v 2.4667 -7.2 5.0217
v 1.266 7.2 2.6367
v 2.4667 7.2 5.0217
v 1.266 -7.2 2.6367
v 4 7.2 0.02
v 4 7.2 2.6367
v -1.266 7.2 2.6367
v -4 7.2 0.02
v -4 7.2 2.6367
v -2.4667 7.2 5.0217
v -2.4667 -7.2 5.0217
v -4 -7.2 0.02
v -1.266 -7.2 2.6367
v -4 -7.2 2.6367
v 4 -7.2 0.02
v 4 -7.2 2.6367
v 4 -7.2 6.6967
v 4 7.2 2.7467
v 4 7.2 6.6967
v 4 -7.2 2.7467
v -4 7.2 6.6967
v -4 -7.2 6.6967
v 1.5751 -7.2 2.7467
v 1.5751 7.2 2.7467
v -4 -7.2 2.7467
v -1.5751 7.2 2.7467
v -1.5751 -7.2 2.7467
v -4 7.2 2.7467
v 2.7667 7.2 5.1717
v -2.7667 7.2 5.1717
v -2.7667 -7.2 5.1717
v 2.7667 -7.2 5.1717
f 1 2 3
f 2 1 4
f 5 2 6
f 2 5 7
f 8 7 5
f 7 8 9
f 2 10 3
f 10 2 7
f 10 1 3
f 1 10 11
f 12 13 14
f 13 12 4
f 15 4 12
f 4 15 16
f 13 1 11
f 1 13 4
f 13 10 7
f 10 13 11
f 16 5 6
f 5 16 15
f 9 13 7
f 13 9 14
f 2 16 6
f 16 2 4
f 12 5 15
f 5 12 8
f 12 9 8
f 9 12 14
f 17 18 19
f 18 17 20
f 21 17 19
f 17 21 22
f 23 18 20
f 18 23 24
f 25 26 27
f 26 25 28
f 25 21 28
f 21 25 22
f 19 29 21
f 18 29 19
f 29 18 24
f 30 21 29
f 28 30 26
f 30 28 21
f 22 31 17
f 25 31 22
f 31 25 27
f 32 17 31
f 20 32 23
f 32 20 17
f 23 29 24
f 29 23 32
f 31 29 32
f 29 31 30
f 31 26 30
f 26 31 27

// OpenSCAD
// Generated by SolidPython 1.1.1 on 2021-06-21 20:42:31


translate(v = [0, 0, 2.6716666667]) {
	union() {
		union() {
			translate(v = [0, 7.2000000000, 0]) {
				rotate(a = 90, v = [1, 0, 0]) {
					linear_extrude(height = 14.4000000000) {
						polygon(points = [[-2.4666666667, 2.3500000000], [2.4666666667, 2.3500000000], [1.2333333333, -0.1000000000], [-1.2333333333, -0.1000000000]]);
					}
				}
			}
			translate(v = [0, 0, -1.3433333333]) {
				cube(center = true, size = [8, 14.4000000000, 2.6166666667]);
			}
		}
		difference() {
			translate(v = [0, 0, 2.0500000000]) {
				cube(center = true, size = [8, 14.4000000000, 3.9500000000]);
			}
			translate(v = [0, 7.2500000000, 0]) {
				rotate(a = 90, v = [1, 0, 0]) {
					linear_extrude(height = 14.5000000000) {
						polygon(points = [[-2.7666666667, 2.5000000000], [2.7666666667, 2.5000000000], [1.5333333333, -0.0100000000], [-1.5333333333, -0.0100000000]]);
					}
				}
			}
		}
	}
}
/***********************************************
*********      SolidPython code:      **********
************************************************
 
from copy import deepcopy
import solid as sl
import numpy as np
from numpy import pi
import os.path as path
from shape import Shape, rad2deg
from joint import Joint


KEYSWITCH_WIDTH = 14.4


# TODO: thumb cluster, wall / supports, wrist rest

# TODO: function to allign cols to a chosen row and vert align_cols(row, vert)
# would stretch out some of the more compressed rows

# TODO: function to stagger a column, like raise the pinky column up
# would need to calculate the change in the original z vector, [0,0,1]
# due to rotations to the key so we are going up in relation to the
# direction of the keys. Try only considering Y roatations to start
# considering x rotations may compress the column which we do not want

class KeyCapShape(Shape):
    def __init__(self, dims):
        super().__init__()
        self.dims = dims

    def init_shape(self):
        return sl.cube(self.dims, center=True)

    def init_origin(self):
        return np.array([0, 0, 0])

    def init_vertices(self):
        w, l, h = self.dims
        half_width = w / 2
        half_len = l / 2
        half_height = h / 2
        adj = .5
        return np.array([
            [half_width - adj, half_len - adj, -half_height + adj],
            [half_width - adj, -half_len + adj, -half_height + adj],
            [-half_width + adj, half_len - adj, -half_height + adj],
            [-half_width + adj, -half_len + adj, -half_height + adj],
            [half_width - adj, half_len - adj, half_height - adj],
            [half_width - adj, -half_len + adj, half_height - adj],
            [-half_width + adj, half_len - adj, half_height - adj],
            [-half_width + adj, -half_len + adj, half_height - adj]
        ])

    def init_vertice_shape(self):
        return sl.cube([1, 1, 1], center=True)

    def vert_colors(self):
        return [[1, 0, 0], [0, 1, 0], [0, 0, 1], [1, 0, 1],
                [1, 0, 0], [0, 1, 0], [0, 0, 1], [1, 0, 1]]


class SocketSkirt(Shape):
    def __init__(self, dims, switch_width, axis, deg):
        super().__init__()
        self.dims = dims

        x_trans = switch_width / 2 + dims[0] / 2 - 1
        self.rotate_y(deg)
        self.translate([x_trans, 0, -1])
        rot_deg = 90 * axis
        self.rotate_z(rot_deg)

    def init_vertices(self):
        w, l, h = self.dims
        hw, hl, hh = w / 2, l / 2, h / 2
        adj = 1
        return [
            [hw - adj, hl - adj, -adj],
            [hw - adj, -hl, -adj],
            [-hw, -hl, -adj],
            [-hw, hl-adj, -adj]
        ]

    def init_vertice_shape(self):
        return sl.cube([1, 1, self.dims[2]])

    def vert_colors(self):
        return [[1, 0, 0], [0, 1, 0], [0, 0, 1], [1, 0, 1]]

    def init_origin(self):
        return [0, 0, 0]

    def init_shape(self):
        return sl.cube(self.dims, center=True)


def SocketJoint(joint, key, axis, flip=False, trans=[0,0,0], hull=None):
    rot_deg = 90*axis
    if flip:
        joint.rotate_z(90)
    x_trans = key.width / 2 + joint.dim[0] / 2 + key.thickness/4 + .5
    joint.translate(np.add([x_trans, 0, 0], trans))
    joint.rotate_z(rot_deg)
    joint.actions += key.actions
    if hull:
        sock_axis_verts = [(1,3), (0,1), (0,2), (0,2)]
        joint_axis_verts = [3,3,0,3]
        if hull == "top":
            jhull = joint.top()
        elif hull=="bottom":
            jhull = joint.bottom()
        else:
            return joint, None
        hull = sl.difference()(sl.hull()(
            jhull.vertice_shape(joint_axis_verts[axis]),
            key.vertice_shapes(idxs=sock_axis_verts[axis])), joint.shape())

    return joint, hull

class SocketArea(Shape):
    def __init__(self, dim):
        super().__init__()
        self.dim = dim

    def init_shape(self):
        return sl.color([0,0,1], alpha=0.4)(sl.cube(self.dim, center=True))


class SwitchSocket(Shape):
    def __init__(self, dim, hot_swap=None, skirt=(0, 0, 0, 0),
                 cylinder_segments=100, side="right"):
        super().__init__()
        self.width, self.height, self.thickness = dim
        self.skirts = skirt
        self.cylinder_segments = cylinder_segments
        self.side = side
        self.hotswap_socket = hot_swap

    def init_shape(self):
        top_wall = sl.cube([self.width + 3, 1.5, self.thickness],
                           center=True)
        top_wall = sl.translate(
            (0, (1.5 / 2) + (self.height / 2), self.thickness / 2)
        )(top_wall)

        left_wall = sl.cube([1.5, self.height + 3, self.thickness],
                            center=True)
        left_wall = sl.translate(
            ((1.5 / 2) + (self.width / 2), 0, self.thickness / 2)
        )(left_wall)

        side_nub = sl.cylinder(1, 2.75, segments=self.cylinder_segments,
                               center=True)
        side_nub = sl.rotate(rad2deg(pi / 2), [1, 0, 0])(side_nub)
        side_nub = sl.translate((self.width / 2, 0, 1))(side_nub)
        nub_cube = sl.cube([1.5, 2.75, self.thickness], center=True)
        nub_cube = sl.translate(
            ((1.5 / 2) + (self.width / 2), 0, self.thickness / 2)
        )(nub_cube)

        side_nub = sl.hull()(side_nub, nub_cube)

        plate_half1 = top_wall + left_wall + side_nub
        plate_half2 = plate_half1
        plate_half2 = sl.mirror([0, 1, 0])(plate_half2)
        plate_half2 = sl.mirror([1, 0, 0])(plate_half2)

        plate = plate_half1 + plate_half2

        if self.hotswap_socket is not None:
            self.hotswap_socket = sl.translate((0, 0, self.thickness))(
                self.hotswap_socket)
            plate = sl.union()(plate, self.hotswap_socket)

        if self.side == "left":
            plate = sl.mirror([-1, 0, 0])(plate)

        return plate

    def init_origin(self):
        return np.array([0, 0, 0])

    def init_vertices(self):
        hw = (self.width + self.thickness) / 2
        hh = (self.width + self.thickness) / 2
        th = self.thickness / 2
        adj = 1
        return np.array([
            [-hw + adj, hh - adj, th],
            [hw - adj, hh - adj, th],
            [-hw + adj, -hh + adj, th],
            [hw - adj, -hh + adj, th]
        ])

    def init_vertice_shape(self):
        return sl.cube([1, 1, self.thickness - 1], center=True)

    def vert_colors(self):
        return [[1, 0, 0], [0, 1, 0], [0, 0, 1], [1, 0, 1]]

    def area(self):
        w,l,h = self.width, self.height, self.thickness
        # this area is flush with the top of the socket
        # area = SocketArea([w, l, h*2])

        area = SocketArea([w, l, h*3])
        area.actions = self.actions

        swap_area = SocketArea([w+h+.5,10,4.5])
        swap_area.translate(np.add(-self.init_vertices()[3], [(w)/2+.5,-4.4,
                                                              -.25]))
        swap_area.actions += self.actions

        return sl.union()(area.shape(), swap_area.shape())

    @staticmethod
    def face_vertice_idxs(axis):
        face_vertices = [(0,1), (1,3), (2,3), (0,2)]
        return face_vertices[axis]

    def face_vertices(self, axis):
        return self.vertices(idxs=self.face_vertice_idxs(axis))

    def face_vertice_shapes(self, axis):
        return self.vertice_shapes(idxs=self.face_vertice_idxs(axis))

class KeysGrid(Shape):
    def __init__(self, nrows, ncols, row_deg, col_deg, row_deg_steps,
                 col_deg_steps, cap_dim, switch_dim, switch_height, spacing=1,
                 hot_swap=True, row_degs=None, col_degs=None):
        super().__init__()
        self.nrows = nrows
        self.ncols = ncols
        self.spacing = spacing
        self.row_deg = row_deg
        self.col_deg = col_deg
        self.cap_dim = cap_dim
        self.switch_dim = switch_dim
        self.switch_height = switch_height
        self.skirts = None
        self.skirt_hulls = None
        self.hot_swap = None
        if hot_swap:
            self.hot_swap = self.hotswap_socket()

        self.row_degs = row_degs
        if row_degs is None or len(row_degs) != nrows:
            self.row_degs = self._deg_steps(row_deg, nrows, row_deg_steps)

        self.col_degs = col_degs
        if col_degs is None or len(col_degs) != ncols:
            self.col_degs = self._deg_steps(col_deg, ncols, col_deg_steps)
        self.caps = self._init_array(nrows, ncols)
        self.switches = self._init_array(nrows, ncols)
        self.skirts = []
        self._place_caps_and_switches()

    @staticmethod
    def _init_array(rows, cols):
        return [[None for _ in range(cols)] for _ in range(rows)]

    @staticmethod
    def _deg_steps(deg, steps, step_size):
        return [deg + step * step_size for step in range(steps)]

    def _align_xyz(self, cap1, cap2, axis):
        if axis == 1:
            verts1, verts2 = (0, 2, 4, 6), (1, 3, 5, 7)
        else:
            verts1, verts2 = (0, 1, 4, 5), (2, 3, 6, 7)
        coords1 = np.array(cap1.vertices(idxs=verts1))
        coords2 = np.array(cap2.vertices(idxs=verts2))
        # get the closest vertice
        vert_idx = np.argmin(np.abs(np.subtract(coords1[:, axis],
                                                coords2[:, axis])))
        vec = np.subtract(coords1[vert_idx], coords2[vert_idx])
        # if axis == 0:
        #     vec[axis] = vec[axis] - self.spacing
        return vec

    def _align_caps(self, cap1, cap2, axis):
        """translates cap2 to cap1"""
        xyz = self._align_xyz(cap1, cap2, axis)
        cap2.translate(xyz)

    def align_row(self, row):
        cap = self.caps[row][0]
        switch = self.switches[row][0]
        for col in range(1, self.ncols):
            if row != 0:
                # align the columns
                xyz = self._align_xyz(self.caps[(row - 1)][col - 1], cap, 0)
                cap.translate(xyz)
                switch.translate(xyz)
            align_cap = self.caps[row][col]
            align_switch = self.switches[row][col]
            xyz = self._align_xyz(cap, align_cap, 1)
            align_cap.translate(xyz)
            align_switch.translate(xyz)
            cap = align_cap
            switch = align_switch
        if row != 0:
            # align the columns
            xyz = self._align_xyz(self.caps[(row - 1)][col], cap, 0)
            cap.translate(xyz)
            switch.translate(xyz)

    def _switch_hull(self, switch1, switch2, axis):
        if axis == 1:
            verts1, verts2 = (0, 1), (2, 3)
        else:
            verts1, verts2 = (1, 3), (0, 2)
        vert_shapes1 = switch1.vertice_shapes(idxs=verts1)
        vert_shapes2 = switch2.vertice_shapes(idxs=verts2)
        return sl.hull()(vert_shapes1, vert_shapes2)

    def _switch_row_hulls(self, row):
        hulls = []
        switch = self.switches[row][0]
        for col in range(1, self.ncols):
            align_switch = self.switches[row][col]
            if row != 0:
                hulls.append(self._switch_hull(self.switches[row - 1][col - 1],
                                               switch, 0))
            hulls.append(self._switch_hull(switch, align_switch, 1))
            switch = align_switch
        if row != 0:
            hulls.append(self._switch_hull(self.switches[row - 1][col],
                                           switch, 0))
        return hulls

    def switch_hulls(self):
        return [sl.union()(self._switch_row_hulls(row)) for row in range(
            self.nrows)]

    def _place_cap_and_switch(self, row, col):
        xyz = [row * self.cap_dim[0],
               col * self.cap_dim[1],
               self.cap_dim[2] * col]
        cap = KeyCapShape(self.cap_dim)
        switch = SwitchSocket(self.switch_dim, hot_swap=self.hot_swap)
        switch.translate([0, 0, -self.switch_height])
        cap.rotate(self.col_degs[col], self.row_degs[row])
        switch.rotate(self.col_degs[col], self.row_degs[row])
        cap.translate(xyz)
        switch.translate(xyz)
        self.caps[row][col] = cap
        self.switches[row][col] = switch

    def _place_caps_and_switches(self):
        [[self._place_cap_and_switch(row, col) for col in range(self.ncols)] for
         row in
         range(self.nrows)]
        [self.align_row(row) for row in range(self.nrows)]

    def init_shape(self, with_caps=False):
        shapes = []
        if with_caps:
            for row in self.caps:
                for cap in row:
                    shapes.append(cap.shape())
        for row in self.switches:
            for switch in row:
                shapes.append(switch.shape())
                shapes.append(switch.vertice_shapes())

        for row in self.skirts:
            for skirt in row:
                if skirt:
                    shapes.append(skirt.shape())
                    shapes.append(skirt.vertice_shapes())

        if self.skirt_hulls:
            shapes += self.skirt_hulls
        return sl.union()(shapes, self.switch_hulls())

    def init_vertices(self):
        verts = [self.switches[0][col].vertice(2) for col in range(self.ncols)]
        verts += [self.switches[row][-1].vertice(0) for row in
                  range(
                      self.nrows)]
        verts += [self.switches[-1][col].vertice(1) for col in
                  range(self.ncols-1, -1, -1)]
        verts += [self.switches[row][0].vertice(3) for row in
                  range(self.nrows-1, -1, -1)]
        return verts

    def init_vertice_shape(self):
        return self.switches[0][0].init_vertice_shape()

    @staticmethod
    def hotswap_socket():
        plate_file = path.join("..", "src", r"hot_swap_plate.stl")
        return sl.import_(plate_file)

    def add_skirt(self, row, col, axis, deg):
        switch = self.switches[row][col]
        skirt = SocketSkirt([10, 17, 2], self.switch_dim[0], axis, deg)
        skirt.actions += switch.actions
        return skirt

    def add_skirts(self, skirts):
        self.skirts = skirts
        deg = 50
        for axis in range(len(skirts)):
            for idx in range(len(skirts[axis])):
                if skirts[axis][idx]:
                    if axis == 0:
                        skirt = self.add_skirt(self.nrows - 1, idx, axis, deg)
                    elif axis == 1:
                        skirt = self.add_skirt(idx,self.ncols-1,axis,deg)
                    elif axis == 2:
                        skirt = self.add_skirt(0, idx, axis, deg)
                    elif axis == 3:
                        skirt = self.add_skirt(idx,0,axis,deg)
                    else:
                        raise ValueError(f"invalid axis {axis}")
                    self.skirts[axis][idx] = skirt
                if idx != 0 and self.skirts[axis][idx-1]:
                    if axis in [0,3]:
                        self.hull_skirts(self.skirts[axis][idx-1], skirt)
                    else:
                        self.hull_skirts(skirt, self.skirts[axis][idx - 1])
        skirt1, skirt2 = self.skirts[2][0], self.skirts[3][0]
        if skirt1 and skirt2:
            self.hull_skirts(skirt1, skirt2)
        skirt1, skirt2 = self.skirts[3][-1], self.skirts[0][0]
        if skirt1 and skirt2:
            self.hull_skirts(skirt1, skirt2)
        skirt1, skirt2 = self.skirts[0][-1], self.skirts[1][-1]
        if skirt1 and skirt2:
            self.hull_skirts(skirt1, skirt2)
        skirt1, skirt2 = self.skirts[1][0], self.skirts[2][-1]
        if skirt1 and skirt2:
            self.hull_skirts(skirt1, skirt2)



    def hull_skirts(self, skirt1, skirt2):
        vert1 = skirt1.vertice_shapes(idxs=(0,3))
        vert2 = skirt2.vertice_shapes(idxs=(1,2))
        if self.skirt_hulls is None:
            self.skirt_hulls = sl.hull()(vert1, vert2)
        else:
            self.skirt_hulls = sl.union()(self.skirt_hulls,
                                          sl.hull()(vert1, vert2))

    def add_action(self, t: str, args):
        for row in range(self.nrows):
            for col in range(self.ncols):
                self.switches[row][col].add_action(t, args)
                self.caps[row][col].add_action(t, args)

    def base(self, thickness):
        verts = self.vertices()
        for vert in verts:
            vert[2] = 0
        return sl.linear_extrude(thickness)(sl.polygon(verts))


class Base(Shape):
    def __init__(self, init_verts):
        super().__init__()
        for idx in range(len(init_verts)):
            init_verts[idx][2] = 0
        self.init_verts = init_verts

    def init_shape(self):
        return sl.linear_extrude(1.5)(sl.polygon(self.init_verts))

    def init_vertices(self):
        return self.init_verts

    def init_vertice_shape(self):
        return sl.translate([-3,-3,0])(sl.cube([3,3,1.5]))


class Keyboard(Shape):
    def __init__(self, grid, thumbs):
        super().__init__()
        self.grid = grid
        self.thumbs = thumbs
        self.grid_joints = []
        self.thumb_joints = []
        self.base_joints = []
        self.con_joint = None
        self.align_thumbs()
        self.zero_z()
        self.add_base_joints()
        self.add_joints()


    def _hull_1(self):
        x, y, z = self.grid.vertice(self.grid.ncols + 1)

        hpost = sl.cube([1, 2, 1])
        vpost = sl.cube([1, 1, z + 1])
        return sl.union()(sl.translate([x, y + 1, z])(hpost),
                          sl.translate([x, y + 3, 0])(vpost))

    def align_thumbs(self):
        gpoint = self.grid.ncols
        tmid = 2 * self.thumbs.ncols + self.thumbs.nrows + int(
            self.thumbs.nrows / 2) - 1
        gcoord = self.grid.vertice(gpoint)
        tcoord = self.thumbs.vertice(tmid)
        x, y, z = np.subtract(gcoord, tcoord)
        self.thumbs.translate([x-5, y, z])

    def zero_z(self):
        verts = self.vertices()
        verts = [vert[2] for vert in verts]
        min_vert = np.min(verts)
        self.translate([0,0,-min_vert+5])

    def add_joints(self):
        joint1 = Joint([14.4, 14.4, 8])
        joint1.translate([0,0,-2])
        joint2 = Joint([14.4, 8, 4], deg=90)
        grid_sock = deepcopy(self.grid.switches[0][-1])
        thumb_sock = deepcopy(self.thumbs.switches[-1][0])

        # drop this socket down so the keycap doesnt hit it
        joint1, grid_hull1 = SocketJoint(joint1, grid_sock, 1, trans=[0,0,-1.5],
                                        hull="top")
        joint2, grid_hull2 = SocketJoint(joint2, grid_sock, 2,
                                         hull="top")

        grid_sock_shape = self.grid.switches[0][-1].shape()
        grid_sock_area = self.grid.switches[0][-1].area()
        thumb_sock_area = thumb_sock.area()

        bot1 = joint1.bottom()
        bot2 = joint2.bottom()

        thumb_hull1 = sl.hull()(thumb_sock.vertice_shapes(idxs=(1,3)),
                               bot1.vertice_shape(0))
        thumb_hull1 = sl.difference()(thumb_hull1, grid_sock_shape,
                                      joint2.shape(), grid_sock_area,
                                      thumb_sock_area)

        thumb_hull2 = sl.hull()(thumb_sock.vertice_shapes(idxs=(2,3)),
                                bot2.vertice_shape(2))
        thumb_hull2 = sl.difference()(thumb_hull2, joint2.shape(),
            thumb_hull1, thumb_sock_area, grid_sock_area, grid_sock_shape)

        joint2_bot_shape = sl.difference()(bot2.shape(),
                                           thumb_sock_area, grid_sock_area,
                                           grid_sock_shape)

        self.grid_joints += [joint1.top().shape(), joint2.top().shape(),
                             grid_hull1, grid_hull2]
        self.thumb_joints += [bot1.shape(), joint2_bot_shape,
                              thumb_hull1, thumb_hull2]

        # the socket gets messed up if we don't do this. Don't know why
        self.grid.switches[0][-1] = grid_sock


    def add_grid_skirts(self):
        self.grid.add_skirts([
            [True for _ in range(self.grid.ncols)],
            [True if row > 0 else False for row in range(self.grid.nrows)],
            [True if col < (self.grid.ncols-1) else False  for col in range(
                self.grid.ncols)],
            [True for _ in range(self.grid.nrows)]
        ])

    def add_thumb_skirts(self):
        self.thumbs.add_skirts([
            [True if col > 0 else False for col in range(self.thumbs.ncols)],
            [True for _ in range(self.thumbs.nrows)],
            [True for _ in range(self.thumbs.ncols)],
            [True if row < (self.thumbs.nrows-1) else False for row in range(
                self.thumbs.nrows)],
        ])

    def add_action(self, t: str, args):
        self.grid.add_action(t, args)
        self.thumbs.add_action(t, args)

    def init_shape(self):
        return sl.union()(self.grid.shape(), self.thumbs.shape(),
                          self.grid_joints, self.thumb_joints,
                          self.base_joints,
                          self.base().shape())

    def init_vertices(self):
        return self.grid.init_vertices() + self.thumbs.init_vertices()

    def init_vertice_shape(self):
        return self.grid.init_vertice_shape()

    def base(self):
        verts = self.grid.vertices(idxs=range(self.grid.nrows-1)) + \
            self.thumbs.vertices(idxs=range(
                self.thumbs.nrows+2*self.thumbs.ncols+1)) + \
            self.grid.vertices(idxs=range(self.grid.nrows+3,
                                          len(self.grid.init_vertices()) ))
        return Base(verts)

    def add_base_joints(self):
        self.add_base_joint(self.grid, 0, 0, 2)
        self.add_base_joint(self.grid, -1, 0, 2)
        self.add_base_joint(self.grid, -1, -1, 0)
        self.add_base_joint(self.thumbs, 0, -1, 0)
        self.add_base_joint(self.thumbs, -1, -1, 0)
        self.add_base_joint(self.thumbs, 0, 0, 2)


    def base_joint_deg_movement(self, grid, col, axis):
        col_deg = grid.col_degs[col]
        if axis == 0 and col_deg >= -20:
            return [0, 8, 0]
        if axis == 2 and col_deg <=20:
            return [0, -5, 0]
        return [0,0,0]


    def add_leg(self, grid, row, col, axis):
        key = deepcopy(grid.switches[row][col])
        face_verts = key.face_vertices(axis)
        key_joint = Joint([14.4, 14.4, 5])
        key_joint = SocketJoint(key_joint, )

        base_joint = Joint([14.4, 14.4, 5]).rotate_x(90).rotate_z(90)



    def add_base_joint(self, grid, row, col, axis):
        base = self.base()
        key = deepcopy(grid.switches[row][col])
        face_verts = key.face_vertices(axis)

        #TODO: add legs if joint is to tall
        h = min(face_verts[0][2], face_verts[1][2])/2
        print("min height", h)
        #TODO: move away from keygrid if rotation angle is too steep
        trans = np.add(face_verts[0], face_verts[1]) / 2
        joint = Joint([14.4,10,h])
        trans[2] = joint.height()/2
        trans = np.asarray(np.add(trans,
                self.base_joint_deg_movement(grid, col, axis)))
        joint.translate(trans)

        top = joint.top()
        bot = joint.bottom()

        key_area = key.area()
        # key_shape = key.shape()

        base_verts = np.asarray(base.vertices())
        base_dist = np.sum((base_verts - trans)**2, axis=1)
        base_vert_idxs = np.argsort(base_dist)[:4]


        base_hull = sl.hull()(base.vertice_shapes(idxs=base_vert_idxs),
                              bot.vertice_shape(4))
        switch_hull = sl.hull()(key.face_vertice_shapes(axis),
                                top.vertice_shape(-1))
        switch_hull = sl.difference()(switch_hull, key_area,
                                      bot.shape())

        top_shape = sl.difference()(top.shape(), key_area)

        self.base_joints += [bot.shape(), base_hull]
        self.grid_joints += [switch_hull, top_shape]

        sl.scad_render_to_file(sl.union()(joint.shape(), self.base().shape(),
                                          key.shape(), key.area(),
                                          top.vertice_shapes(),
                                          base_hull,
                                          switch_hull, key.vertice_shapes()),
                               "base_joints.scad")


if __name__ == '__main__':
    keygrid = KeysGrid(4, 6, 20, 50, -30, -6,
                       [17, 17, 1], [14.4, 14.4, 4], 10,
                       row_degs=[20, -10, -40, -80])

    thumb_cluster = KeysGrid(2, 3, -20, -40, -30, -20,
                             [17, 19.5, 1], [14.4, 14.4, 4], 10)
    thumb_cluster.rotate_z(10)

    keyboard = Keyboard(keygrid, thumb_cluster)

    # thumb_cluster.rotate_z(25)
    # thumb_cluster.rotate_y(30)

    # skirt = SocketSkirt([10, 17, 2], 14.4, 0, 30)
    # socket = SwitchSocket([14.4, 14.4, 4])
    sl.scad_render_to_file(sl.union()(keyboard.shape()),
                           r"keycap.scad")
    #
    joint = Joint([8,14.4,4])
    joint.translate([0,0,(4 + 4/3 + .01)/2])

    sl.scad_render_to_file(joint.shape(), r"joint.scad") 
 
************************************************/
